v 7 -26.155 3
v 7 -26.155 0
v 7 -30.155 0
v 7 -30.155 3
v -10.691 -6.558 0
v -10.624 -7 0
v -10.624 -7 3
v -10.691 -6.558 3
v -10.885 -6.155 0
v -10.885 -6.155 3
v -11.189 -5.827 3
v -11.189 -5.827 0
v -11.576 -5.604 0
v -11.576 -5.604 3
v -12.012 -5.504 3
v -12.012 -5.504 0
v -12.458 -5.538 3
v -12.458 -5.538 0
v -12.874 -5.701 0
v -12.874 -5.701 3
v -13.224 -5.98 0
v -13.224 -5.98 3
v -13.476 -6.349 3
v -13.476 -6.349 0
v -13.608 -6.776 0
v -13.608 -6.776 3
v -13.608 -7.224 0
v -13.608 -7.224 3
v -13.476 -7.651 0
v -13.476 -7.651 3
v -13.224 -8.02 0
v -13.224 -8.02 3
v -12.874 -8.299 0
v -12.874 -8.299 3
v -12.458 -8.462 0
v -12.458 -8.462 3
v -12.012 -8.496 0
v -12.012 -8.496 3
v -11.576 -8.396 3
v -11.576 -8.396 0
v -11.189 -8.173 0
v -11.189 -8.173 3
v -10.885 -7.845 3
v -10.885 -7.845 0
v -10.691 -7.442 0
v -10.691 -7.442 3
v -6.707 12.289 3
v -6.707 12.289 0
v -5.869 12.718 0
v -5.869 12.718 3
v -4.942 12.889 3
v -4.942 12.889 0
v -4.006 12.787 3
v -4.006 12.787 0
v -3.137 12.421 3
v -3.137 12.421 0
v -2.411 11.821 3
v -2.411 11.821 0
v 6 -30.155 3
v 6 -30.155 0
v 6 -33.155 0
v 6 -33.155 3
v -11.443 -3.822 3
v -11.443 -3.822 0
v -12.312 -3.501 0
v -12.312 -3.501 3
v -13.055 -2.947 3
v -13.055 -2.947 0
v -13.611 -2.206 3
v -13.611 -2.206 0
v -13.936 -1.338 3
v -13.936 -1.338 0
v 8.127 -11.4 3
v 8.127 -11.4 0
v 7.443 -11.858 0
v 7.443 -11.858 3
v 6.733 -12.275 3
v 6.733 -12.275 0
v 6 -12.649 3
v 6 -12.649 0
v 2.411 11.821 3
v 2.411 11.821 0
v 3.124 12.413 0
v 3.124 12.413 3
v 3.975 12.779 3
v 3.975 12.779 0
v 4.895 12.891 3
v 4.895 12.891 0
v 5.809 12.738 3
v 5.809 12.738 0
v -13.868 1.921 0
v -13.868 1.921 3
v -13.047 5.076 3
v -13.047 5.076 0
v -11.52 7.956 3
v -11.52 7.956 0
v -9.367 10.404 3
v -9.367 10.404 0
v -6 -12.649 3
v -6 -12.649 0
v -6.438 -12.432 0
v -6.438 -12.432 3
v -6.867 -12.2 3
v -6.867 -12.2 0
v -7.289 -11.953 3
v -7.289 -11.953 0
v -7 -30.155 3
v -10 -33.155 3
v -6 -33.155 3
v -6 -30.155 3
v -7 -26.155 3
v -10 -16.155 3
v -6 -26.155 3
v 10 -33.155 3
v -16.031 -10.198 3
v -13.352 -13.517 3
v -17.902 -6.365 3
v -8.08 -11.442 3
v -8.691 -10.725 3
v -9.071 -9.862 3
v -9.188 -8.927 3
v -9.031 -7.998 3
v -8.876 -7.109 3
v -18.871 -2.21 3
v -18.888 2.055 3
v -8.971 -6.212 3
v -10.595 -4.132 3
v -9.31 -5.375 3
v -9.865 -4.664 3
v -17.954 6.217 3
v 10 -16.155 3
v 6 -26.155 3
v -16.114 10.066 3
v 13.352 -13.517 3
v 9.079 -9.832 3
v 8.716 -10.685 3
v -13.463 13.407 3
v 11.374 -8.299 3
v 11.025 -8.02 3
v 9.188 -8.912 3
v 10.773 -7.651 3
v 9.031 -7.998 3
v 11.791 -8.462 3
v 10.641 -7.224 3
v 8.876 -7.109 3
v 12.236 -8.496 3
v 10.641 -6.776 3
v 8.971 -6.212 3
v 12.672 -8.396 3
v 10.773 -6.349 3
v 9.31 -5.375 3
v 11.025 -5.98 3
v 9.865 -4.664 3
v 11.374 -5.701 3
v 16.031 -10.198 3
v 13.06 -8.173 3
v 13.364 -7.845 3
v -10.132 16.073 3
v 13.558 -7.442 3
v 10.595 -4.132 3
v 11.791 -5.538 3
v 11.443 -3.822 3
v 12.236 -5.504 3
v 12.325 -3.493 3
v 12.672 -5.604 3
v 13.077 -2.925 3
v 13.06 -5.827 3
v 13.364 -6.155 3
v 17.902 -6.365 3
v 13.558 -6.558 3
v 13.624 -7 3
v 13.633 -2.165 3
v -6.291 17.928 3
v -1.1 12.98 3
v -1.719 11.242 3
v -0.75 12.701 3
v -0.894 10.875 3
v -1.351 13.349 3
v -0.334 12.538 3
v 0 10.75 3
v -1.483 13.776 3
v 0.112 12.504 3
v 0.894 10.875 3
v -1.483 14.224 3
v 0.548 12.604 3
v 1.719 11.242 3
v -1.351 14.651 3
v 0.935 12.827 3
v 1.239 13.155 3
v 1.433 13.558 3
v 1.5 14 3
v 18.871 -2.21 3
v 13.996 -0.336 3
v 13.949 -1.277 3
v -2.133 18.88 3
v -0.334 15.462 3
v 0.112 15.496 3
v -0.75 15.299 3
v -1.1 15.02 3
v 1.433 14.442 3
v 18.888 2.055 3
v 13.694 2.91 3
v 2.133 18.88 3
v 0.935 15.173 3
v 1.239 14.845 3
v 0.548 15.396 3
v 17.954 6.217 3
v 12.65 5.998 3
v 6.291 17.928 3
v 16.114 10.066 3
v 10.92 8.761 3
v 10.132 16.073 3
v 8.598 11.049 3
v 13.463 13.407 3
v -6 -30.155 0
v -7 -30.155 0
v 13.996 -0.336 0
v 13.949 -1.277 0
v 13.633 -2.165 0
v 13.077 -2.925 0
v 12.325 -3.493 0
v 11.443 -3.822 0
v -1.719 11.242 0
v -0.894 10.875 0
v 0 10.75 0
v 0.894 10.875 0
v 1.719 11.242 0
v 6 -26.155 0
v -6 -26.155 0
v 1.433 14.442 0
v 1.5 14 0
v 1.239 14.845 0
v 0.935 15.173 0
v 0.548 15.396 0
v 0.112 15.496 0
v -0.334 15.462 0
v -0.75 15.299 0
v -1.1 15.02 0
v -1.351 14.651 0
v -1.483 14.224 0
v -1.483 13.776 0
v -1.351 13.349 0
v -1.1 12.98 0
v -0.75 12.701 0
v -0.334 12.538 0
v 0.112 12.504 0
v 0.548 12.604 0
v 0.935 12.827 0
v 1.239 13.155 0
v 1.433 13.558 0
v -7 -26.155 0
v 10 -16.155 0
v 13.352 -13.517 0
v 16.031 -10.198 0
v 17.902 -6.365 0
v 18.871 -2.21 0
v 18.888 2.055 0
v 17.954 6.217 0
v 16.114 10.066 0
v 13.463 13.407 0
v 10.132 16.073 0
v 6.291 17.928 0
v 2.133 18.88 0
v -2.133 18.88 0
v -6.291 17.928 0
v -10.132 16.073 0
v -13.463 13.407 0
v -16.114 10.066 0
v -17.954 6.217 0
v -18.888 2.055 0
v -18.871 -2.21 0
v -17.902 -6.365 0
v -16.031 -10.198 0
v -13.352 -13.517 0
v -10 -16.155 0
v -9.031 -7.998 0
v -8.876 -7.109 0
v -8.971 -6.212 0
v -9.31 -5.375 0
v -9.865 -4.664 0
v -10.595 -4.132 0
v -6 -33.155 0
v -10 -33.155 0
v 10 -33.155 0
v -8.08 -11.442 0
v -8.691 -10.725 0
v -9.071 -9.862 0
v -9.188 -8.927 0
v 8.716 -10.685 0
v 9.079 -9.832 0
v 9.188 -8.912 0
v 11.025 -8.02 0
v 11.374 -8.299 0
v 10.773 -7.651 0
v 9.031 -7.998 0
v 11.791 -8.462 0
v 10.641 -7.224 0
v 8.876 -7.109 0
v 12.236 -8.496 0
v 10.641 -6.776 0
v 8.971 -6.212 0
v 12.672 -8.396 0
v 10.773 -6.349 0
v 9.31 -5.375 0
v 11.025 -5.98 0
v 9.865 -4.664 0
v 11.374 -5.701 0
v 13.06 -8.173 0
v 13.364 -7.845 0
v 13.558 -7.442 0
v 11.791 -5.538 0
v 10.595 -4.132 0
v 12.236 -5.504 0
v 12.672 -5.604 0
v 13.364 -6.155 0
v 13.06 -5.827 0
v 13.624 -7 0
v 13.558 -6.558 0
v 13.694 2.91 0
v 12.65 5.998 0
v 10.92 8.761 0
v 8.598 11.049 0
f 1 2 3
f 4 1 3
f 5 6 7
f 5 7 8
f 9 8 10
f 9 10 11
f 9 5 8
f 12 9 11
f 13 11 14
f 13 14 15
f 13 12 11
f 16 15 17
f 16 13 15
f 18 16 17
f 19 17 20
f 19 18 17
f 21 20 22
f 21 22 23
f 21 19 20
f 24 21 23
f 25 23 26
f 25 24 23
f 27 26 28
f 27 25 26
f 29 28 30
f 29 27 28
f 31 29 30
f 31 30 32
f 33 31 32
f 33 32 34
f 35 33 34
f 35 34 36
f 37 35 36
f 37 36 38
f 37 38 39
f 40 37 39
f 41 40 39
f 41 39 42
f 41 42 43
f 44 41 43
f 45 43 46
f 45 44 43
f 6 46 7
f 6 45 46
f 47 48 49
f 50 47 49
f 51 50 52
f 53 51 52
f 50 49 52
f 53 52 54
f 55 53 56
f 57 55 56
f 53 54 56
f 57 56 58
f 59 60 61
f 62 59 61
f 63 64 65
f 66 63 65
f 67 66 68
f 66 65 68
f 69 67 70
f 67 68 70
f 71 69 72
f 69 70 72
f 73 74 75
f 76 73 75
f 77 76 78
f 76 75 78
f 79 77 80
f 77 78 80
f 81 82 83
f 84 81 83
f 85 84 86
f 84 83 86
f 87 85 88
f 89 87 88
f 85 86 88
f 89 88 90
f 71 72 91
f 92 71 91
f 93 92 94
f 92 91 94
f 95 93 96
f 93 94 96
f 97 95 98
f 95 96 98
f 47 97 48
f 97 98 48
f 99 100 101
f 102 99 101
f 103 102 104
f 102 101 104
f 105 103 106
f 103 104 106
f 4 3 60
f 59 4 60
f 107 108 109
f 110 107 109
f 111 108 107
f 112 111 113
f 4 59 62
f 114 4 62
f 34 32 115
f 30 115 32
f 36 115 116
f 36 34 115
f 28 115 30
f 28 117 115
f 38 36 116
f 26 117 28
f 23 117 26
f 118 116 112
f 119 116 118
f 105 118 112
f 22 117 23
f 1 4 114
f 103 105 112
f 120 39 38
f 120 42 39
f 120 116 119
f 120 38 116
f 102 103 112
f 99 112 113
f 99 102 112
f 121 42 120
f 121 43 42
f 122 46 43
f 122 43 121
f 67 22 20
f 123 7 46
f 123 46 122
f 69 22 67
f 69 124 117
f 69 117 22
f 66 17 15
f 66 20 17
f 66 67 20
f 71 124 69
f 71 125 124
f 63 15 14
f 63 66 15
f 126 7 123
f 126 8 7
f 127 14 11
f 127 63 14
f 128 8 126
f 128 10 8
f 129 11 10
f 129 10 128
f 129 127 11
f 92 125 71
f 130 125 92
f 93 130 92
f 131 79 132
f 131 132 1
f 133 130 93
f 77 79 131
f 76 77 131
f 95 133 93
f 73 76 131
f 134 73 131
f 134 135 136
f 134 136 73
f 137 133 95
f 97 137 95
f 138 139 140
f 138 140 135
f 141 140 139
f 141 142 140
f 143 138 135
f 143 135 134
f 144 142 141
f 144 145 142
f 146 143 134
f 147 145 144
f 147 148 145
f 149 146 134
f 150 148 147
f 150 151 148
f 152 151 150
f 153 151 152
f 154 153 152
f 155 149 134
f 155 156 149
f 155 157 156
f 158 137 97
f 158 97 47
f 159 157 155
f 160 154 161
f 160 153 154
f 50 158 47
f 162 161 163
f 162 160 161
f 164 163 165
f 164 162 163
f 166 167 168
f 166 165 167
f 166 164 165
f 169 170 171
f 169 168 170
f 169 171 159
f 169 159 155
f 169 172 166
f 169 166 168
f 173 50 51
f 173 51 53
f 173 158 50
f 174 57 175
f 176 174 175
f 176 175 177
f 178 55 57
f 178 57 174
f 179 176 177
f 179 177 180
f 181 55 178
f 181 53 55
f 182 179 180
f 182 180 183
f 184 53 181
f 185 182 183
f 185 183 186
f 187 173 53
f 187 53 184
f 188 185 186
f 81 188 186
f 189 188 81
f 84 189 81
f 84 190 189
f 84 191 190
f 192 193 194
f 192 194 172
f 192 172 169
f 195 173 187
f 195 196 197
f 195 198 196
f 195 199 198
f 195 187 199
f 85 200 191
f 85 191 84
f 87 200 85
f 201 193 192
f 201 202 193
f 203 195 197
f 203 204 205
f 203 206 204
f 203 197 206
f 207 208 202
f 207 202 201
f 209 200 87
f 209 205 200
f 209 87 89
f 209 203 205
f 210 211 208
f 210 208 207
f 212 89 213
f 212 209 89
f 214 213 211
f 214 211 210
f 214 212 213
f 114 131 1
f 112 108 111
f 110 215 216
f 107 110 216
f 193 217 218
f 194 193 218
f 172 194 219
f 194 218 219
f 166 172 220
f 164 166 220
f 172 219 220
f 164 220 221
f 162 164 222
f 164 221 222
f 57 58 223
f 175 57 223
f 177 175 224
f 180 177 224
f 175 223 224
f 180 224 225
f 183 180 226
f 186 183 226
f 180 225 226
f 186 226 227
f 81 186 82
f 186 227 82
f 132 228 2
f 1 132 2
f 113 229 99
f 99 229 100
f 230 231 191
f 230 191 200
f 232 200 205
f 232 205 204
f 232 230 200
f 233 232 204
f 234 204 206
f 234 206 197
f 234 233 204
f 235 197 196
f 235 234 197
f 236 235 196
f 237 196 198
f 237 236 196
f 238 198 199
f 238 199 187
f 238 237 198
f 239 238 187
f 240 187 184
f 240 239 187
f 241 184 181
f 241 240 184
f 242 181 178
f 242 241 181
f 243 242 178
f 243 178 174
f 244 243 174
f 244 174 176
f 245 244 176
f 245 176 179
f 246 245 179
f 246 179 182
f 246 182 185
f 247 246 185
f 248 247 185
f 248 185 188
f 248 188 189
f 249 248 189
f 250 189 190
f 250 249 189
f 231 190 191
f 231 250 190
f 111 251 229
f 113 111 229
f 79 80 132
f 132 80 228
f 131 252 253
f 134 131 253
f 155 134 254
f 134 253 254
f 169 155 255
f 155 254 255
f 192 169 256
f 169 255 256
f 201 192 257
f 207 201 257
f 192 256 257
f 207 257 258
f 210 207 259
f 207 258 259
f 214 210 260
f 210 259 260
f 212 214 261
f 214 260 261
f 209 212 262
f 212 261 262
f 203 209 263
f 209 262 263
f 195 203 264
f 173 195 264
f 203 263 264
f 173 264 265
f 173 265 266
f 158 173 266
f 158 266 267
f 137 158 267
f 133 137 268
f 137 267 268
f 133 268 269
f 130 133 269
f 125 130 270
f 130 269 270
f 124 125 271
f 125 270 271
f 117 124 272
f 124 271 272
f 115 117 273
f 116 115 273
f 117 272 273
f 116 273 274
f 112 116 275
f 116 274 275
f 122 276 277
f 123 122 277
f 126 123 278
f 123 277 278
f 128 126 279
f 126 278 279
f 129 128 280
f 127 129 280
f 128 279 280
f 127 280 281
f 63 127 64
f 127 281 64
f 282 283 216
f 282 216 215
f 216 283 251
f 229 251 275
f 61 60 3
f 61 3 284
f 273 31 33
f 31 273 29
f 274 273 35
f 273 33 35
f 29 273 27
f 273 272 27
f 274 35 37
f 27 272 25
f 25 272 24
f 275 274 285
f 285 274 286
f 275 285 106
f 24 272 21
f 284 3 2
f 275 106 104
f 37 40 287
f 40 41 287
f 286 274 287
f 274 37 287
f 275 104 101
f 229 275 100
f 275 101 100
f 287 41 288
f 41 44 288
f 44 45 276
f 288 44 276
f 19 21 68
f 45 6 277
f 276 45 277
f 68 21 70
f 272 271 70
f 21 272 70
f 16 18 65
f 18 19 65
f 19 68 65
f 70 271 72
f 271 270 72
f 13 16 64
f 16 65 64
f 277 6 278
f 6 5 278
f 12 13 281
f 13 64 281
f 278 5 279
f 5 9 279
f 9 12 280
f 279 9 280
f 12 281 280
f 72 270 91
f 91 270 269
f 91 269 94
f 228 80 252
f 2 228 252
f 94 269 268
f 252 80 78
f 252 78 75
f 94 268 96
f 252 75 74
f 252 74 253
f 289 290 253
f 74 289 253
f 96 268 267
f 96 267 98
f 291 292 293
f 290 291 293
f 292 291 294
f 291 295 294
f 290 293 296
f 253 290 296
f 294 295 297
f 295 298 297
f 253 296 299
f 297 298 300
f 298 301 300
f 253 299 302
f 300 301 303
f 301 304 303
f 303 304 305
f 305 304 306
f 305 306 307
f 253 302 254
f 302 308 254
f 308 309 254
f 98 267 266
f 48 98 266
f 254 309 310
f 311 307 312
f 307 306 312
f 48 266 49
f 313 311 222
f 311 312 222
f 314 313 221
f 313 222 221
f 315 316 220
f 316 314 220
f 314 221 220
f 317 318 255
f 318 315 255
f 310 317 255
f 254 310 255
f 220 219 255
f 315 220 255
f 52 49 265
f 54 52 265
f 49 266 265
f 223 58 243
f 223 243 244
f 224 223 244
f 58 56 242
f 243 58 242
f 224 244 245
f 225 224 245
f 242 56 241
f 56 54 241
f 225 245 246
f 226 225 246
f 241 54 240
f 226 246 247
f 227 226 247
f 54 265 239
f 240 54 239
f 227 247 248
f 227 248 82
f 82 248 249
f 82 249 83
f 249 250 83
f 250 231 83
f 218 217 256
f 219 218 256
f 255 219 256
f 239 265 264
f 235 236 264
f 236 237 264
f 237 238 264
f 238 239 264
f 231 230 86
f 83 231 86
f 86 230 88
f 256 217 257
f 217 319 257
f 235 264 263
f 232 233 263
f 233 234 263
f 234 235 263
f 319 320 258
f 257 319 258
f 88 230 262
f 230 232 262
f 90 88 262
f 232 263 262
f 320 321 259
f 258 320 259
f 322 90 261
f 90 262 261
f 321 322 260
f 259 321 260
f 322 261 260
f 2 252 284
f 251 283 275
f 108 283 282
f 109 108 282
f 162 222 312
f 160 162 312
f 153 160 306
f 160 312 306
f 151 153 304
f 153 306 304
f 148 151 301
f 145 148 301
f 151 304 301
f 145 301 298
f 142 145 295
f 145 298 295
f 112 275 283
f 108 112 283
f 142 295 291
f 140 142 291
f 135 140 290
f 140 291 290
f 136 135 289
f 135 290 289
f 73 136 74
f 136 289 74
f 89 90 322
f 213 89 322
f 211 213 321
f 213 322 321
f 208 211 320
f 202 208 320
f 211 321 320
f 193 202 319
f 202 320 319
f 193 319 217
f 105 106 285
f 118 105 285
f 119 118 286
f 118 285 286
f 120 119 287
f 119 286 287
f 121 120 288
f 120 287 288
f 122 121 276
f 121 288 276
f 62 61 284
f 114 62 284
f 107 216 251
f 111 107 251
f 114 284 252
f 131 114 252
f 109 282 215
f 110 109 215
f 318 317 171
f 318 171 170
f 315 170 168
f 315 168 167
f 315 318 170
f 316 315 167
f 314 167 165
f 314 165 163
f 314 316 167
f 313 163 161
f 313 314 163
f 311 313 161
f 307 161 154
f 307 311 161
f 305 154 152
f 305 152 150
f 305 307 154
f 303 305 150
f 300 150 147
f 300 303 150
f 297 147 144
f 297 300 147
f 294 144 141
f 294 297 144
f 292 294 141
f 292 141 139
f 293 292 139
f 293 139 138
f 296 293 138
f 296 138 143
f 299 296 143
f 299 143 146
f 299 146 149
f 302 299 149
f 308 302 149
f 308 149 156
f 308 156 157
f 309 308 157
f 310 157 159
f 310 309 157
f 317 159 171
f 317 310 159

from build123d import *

# Parameters (mm, degrees)
ESQUISSE1_R        = 1.5
BOSS_EXTRU_2_DEPTH = 3


with BuildPart() as part:
    # Esquisse1 → Boss.-Extru.2 (new body)
    with BuildSketch(Plane.XY):
        with BuildLine():
            Line((-6, -33.155494421), (-6, -30.155494421))
            Line((-6, -30.155494421), (-7, -30.155494421))
            Line((-7, -30.155494421), (-7, -26.155494421))
            Line((-7, -26.155494421), (-6, -26.155494421))
            Line((-6, -26.155494421), (-6, -12.649110641))
            ThreePointArc((-6, -12.649110641), (-6.653410863, -12.317959405), (-7.288606081, -11.953084179))
            ThreePointArc((-7.288606081, -11.953084179), (-8.912631465, -10.307392628), (-9.031496673, -7.998360322))
            ThreePointArc((-9.031496673, -7.998360322), (-9.309773091, -5.375), (-11.442531564, -3.822325392))
            ThreePointArc((-11.442531564, -3.822325392), (-13.054716827, -2.946828253), (-13.935938611, -1.337764944))
            ThreePointArc((-13.935938611, -1.337764944), (-12.367555464, 6.560760004), (-6.707371512, 12.288660114))
            ThreePointArc((-6.707371512, 12.288660114), (-4.47014813, 12.872261577), (-2.411034891, 11.820685714))
            ThreePointArc((-2.411034891, 11.820685714), (0, 10.75), (2.411034891, 11.820685714))
            ThreePointArc((2.411034891, 11.820685714), (3.975330286, 12.779130538), (5.80943088, 12.737759334))
            ThreePointArc((5.80943088, 12.737759334), (11.865562564, 7.430237213), (13.995977593, -0.335575935))
            ThreePointArc((13.995977593, -0.335575935), (13.382779595, -2.564868949), (11.442531564, -3.822325392))
            ThreePointArc((11.442531564, -3.822325392), (9.309773091, -5.375), (9.031496673, -7.998360322))
            ThreePointArc((9.031496673, -7.998360322), (9.079386541, -9.832302285), (8.126507731, -11.399994391))
            ThreePointArc((8.126507731, -11.399994391), (7.090812931, -12.071469338), (6, -12.649110641))
            Line((6, -12.649110641), (6, -26.155494421))
            Line((6, -26.155494421), (7, -26.155494421))
            Line((7, -26.155494421), (7, -30.155494421))
            Line((7, -30.155494421), (6, -30.155494421))
            Line((6, -30.155494421), (6, -33.155494421))
            Line((6, -33.155494421), (10, -33.155494421))
            Line((10, -33.155494421), (10, -16.155494421))
            ThreePointArc((10, -16.155494421), (0, 19), (-10, -16.155494421))
            Line((-10, -16.155494421), (-10, -33.155494421))
            Line((-10, -33.155494421), (-6, -33.155494421))
        make_face()
        with Locations((0, 14)):
            Circle(ESQUISSE1_R, mode=Mode.SUBTRACT)
        with Locations((12.124355653, -7)):
            Circle(ESQUISSE1_R, mode=Mode.SUBTRACT)
        with Locations((-12.124355653, -7)):
            Circle(ESQUISSE1_R, mode=Mode.SUBTRACT)
    extrude(amount=BOSS_EXTRU_2_DEPTH)


solid = part.part
